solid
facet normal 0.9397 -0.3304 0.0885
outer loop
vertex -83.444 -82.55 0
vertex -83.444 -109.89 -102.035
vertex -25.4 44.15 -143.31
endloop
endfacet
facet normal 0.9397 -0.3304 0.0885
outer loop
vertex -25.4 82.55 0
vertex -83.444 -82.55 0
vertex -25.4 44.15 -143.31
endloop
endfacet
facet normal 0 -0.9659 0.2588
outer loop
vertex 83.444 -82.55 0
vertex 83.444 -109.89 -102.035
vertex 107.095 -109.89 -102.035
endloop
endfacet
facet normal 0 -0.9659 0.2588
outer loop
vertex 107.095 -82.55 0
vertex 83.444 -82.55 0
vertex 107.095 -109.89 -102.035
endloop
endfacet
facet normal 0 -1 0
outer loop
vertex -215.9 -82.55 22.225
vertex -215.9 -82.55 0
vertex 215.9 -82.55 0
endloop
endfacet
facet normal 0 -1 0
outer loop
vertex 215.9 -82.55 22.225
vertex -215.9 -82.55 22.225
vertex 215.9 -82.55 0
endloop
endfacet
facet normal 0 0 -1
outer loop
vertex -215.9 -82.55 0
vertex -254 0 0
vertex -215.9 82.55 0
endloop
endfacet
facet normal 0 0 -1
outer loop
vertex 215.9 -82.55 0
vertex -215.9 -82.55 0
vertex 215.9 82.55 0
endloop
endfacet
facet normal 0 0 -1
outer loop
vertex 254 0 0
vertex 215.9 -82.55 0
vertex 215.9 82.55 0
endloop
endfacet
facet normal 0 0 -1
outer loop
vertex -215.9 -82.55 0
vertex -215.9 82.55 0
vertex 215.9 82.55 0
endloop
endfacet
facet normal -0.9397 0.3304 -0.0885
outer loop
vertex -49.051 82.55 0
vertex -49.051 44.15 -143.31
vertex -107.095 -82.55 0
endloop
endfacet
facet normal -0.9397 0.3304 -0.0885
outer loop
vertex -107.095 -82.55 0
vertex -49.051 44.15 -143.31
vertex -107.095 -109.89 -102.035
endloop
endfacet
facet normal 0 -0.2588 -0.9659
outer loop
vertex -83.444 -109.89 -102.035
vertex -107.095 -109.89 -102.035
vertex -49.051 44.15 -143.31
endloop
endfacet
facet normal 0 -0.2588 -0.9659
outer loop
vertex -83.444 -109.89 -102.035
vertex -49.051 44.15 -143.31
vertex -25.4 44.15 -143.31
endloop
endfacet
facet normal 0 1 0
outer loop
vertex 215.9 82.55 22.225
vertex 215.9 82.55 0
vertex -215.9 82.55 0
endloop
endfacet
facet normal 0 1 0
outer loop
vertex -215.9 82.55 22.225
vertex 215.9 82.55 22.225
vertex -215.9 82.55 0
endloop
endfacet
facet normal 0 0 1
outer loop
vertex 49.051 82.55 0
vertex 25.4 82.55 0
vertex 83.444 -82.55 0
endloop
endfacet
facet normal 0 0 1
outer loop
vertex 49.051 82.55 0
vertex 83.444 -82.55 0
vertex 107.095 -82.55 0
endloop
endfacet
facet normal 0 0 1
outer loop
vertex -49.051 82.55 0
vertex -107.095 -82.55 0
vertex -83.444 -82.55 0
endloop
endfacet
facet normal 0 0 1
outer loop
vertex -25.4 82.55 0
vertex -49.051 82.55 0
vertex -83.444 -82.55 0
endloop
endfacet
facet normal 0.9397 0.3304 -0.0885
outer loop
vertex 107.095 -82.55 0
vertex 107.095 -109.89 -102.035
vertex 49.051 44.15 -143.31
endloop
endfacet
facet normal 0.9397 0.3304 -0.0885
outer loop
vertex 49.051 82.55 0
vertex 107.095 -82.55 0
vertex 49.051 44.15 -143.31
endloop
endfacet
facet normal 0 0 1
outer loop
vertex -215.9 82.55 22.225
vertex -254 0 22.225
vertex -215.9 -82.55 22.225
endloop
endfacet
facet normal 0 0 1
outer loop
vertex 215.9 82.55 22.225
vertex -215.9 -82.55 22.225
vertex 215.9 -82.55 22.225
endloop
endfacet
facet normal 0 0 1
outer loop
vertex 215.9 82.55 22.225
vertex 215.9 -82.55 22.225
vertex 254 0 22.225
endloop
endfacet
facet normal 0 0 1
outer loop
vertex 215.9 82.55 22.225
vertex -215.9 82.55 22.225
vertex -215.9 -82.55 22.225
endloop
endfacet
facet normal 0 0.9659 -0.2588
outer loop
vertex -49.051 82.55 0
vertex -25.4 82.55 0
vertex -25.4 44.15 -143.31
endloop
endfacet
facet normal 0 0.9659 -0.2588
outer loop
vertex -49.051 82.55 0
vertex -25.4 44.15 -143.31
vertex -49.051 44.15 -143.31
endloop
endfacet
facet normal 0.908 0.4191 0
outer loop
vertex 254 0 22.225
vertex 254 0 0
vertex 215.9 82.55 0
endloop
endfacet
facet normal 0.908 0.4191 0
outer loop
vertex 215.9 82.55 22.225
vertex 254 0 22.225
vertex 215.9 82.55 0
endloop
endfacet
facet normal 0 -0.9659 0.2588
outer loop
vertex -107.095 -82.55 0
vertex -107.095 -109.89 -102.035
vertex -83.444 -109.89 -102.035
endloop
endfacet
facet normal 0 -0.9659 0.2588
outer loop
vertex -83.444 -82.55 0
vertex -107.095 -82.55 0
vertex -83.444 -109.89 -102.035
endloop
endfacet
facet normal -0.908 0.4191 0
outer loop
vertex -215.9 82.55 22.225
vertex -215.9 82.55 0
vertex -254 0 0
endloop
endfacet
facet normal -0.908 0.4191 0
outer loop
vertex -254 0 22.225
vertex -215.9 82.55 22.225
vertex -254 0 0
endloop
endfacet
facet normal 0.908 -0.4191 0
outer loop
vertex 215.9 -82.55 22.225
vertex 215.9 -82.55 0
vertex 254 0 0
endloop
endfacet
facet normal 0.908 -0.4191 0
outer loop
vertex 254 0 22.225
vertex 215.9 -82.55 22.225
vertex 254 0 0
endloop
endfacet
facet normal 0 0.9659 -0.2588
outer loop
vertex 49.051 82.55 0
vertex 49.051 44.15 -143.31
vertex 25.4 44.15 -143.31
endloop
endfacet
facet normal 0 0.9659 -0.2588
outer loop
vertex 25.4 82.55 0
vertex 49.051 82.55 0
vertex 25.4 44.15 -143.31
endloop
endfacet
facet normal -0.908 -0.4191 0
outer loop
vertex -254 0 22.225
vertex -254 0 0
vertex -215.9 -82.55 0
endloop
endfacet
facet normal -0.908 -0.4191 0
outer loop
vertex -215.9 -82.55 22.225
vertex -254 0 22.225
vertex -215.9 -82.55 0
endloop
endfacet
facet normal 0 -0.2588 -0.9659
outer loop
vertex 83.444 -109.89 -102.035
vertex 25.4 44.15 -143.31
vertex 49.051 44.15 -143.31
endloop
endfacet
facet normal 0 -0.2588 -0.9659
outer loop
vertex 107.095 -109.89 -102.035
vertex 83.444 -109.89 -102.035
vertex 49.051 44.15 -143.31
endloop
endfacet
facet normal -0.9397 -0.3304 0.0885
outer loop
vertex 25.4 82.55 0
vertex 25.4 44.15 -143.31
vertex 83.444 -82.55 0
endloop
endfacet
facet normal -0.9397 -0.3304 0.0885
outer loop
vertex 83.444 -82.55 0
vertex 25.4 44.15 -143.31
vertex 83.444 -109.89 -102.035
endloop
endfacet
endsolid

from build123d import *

# Parameters (mm, degrees)
F1_DEPTH = 22.225


with BuildPart() as f1:
    # F0 (on Top) → F1 (new body)
    with BuildSketch(Plane.XY):
        Polygon((215.9, 82.55), (-215.9, 82.55), (-254, 0), (-215.9, -82.55), (215.9, -82.55), (254, 0), align=None)
    extrude(amount=F1_DEPTH)


with BuildPart() as f5:
    # F4 (on offset) → F5 (new body, up to the next surface of F1)
    with BuildSketch(Plane(origin=(0, -32.870018728, -122.6725799387), x_dir=(1, 0, 0), z_dir=(0, 0.2588190451, 0.9659258263))):
        Polygon((-49.0513509933, 79.7371769602), (-107.0952689491, -79.7371769602), (-83.4439179558, -79.7371769602), (-25.4, 79.7371769602), align=None)
    extrude(until=Until.NEXT, target=f1.part)


with BuildPart() as f5b:
    # F4 (on offset) → F5, piece 2 (new body, up to the next surface of F1)
    with BuildSketch(Plane(origin=(0, -32.870018728, -122.6725799387), x_dir=(1, 0, 0), z_dir=(0, 0.2588190451, 0.9659258263))):
        Polygon((25.4, 79.7371769602), (83.4439179558, -79.7371769602), (107.0952689491, -79.7371769602), (49.0513509933, 79.7371769602), align=None)
    extrude(until=Until.NEXT, target=f1.part)


solid = Compound([f1.part, f5.part, f5b.part])
